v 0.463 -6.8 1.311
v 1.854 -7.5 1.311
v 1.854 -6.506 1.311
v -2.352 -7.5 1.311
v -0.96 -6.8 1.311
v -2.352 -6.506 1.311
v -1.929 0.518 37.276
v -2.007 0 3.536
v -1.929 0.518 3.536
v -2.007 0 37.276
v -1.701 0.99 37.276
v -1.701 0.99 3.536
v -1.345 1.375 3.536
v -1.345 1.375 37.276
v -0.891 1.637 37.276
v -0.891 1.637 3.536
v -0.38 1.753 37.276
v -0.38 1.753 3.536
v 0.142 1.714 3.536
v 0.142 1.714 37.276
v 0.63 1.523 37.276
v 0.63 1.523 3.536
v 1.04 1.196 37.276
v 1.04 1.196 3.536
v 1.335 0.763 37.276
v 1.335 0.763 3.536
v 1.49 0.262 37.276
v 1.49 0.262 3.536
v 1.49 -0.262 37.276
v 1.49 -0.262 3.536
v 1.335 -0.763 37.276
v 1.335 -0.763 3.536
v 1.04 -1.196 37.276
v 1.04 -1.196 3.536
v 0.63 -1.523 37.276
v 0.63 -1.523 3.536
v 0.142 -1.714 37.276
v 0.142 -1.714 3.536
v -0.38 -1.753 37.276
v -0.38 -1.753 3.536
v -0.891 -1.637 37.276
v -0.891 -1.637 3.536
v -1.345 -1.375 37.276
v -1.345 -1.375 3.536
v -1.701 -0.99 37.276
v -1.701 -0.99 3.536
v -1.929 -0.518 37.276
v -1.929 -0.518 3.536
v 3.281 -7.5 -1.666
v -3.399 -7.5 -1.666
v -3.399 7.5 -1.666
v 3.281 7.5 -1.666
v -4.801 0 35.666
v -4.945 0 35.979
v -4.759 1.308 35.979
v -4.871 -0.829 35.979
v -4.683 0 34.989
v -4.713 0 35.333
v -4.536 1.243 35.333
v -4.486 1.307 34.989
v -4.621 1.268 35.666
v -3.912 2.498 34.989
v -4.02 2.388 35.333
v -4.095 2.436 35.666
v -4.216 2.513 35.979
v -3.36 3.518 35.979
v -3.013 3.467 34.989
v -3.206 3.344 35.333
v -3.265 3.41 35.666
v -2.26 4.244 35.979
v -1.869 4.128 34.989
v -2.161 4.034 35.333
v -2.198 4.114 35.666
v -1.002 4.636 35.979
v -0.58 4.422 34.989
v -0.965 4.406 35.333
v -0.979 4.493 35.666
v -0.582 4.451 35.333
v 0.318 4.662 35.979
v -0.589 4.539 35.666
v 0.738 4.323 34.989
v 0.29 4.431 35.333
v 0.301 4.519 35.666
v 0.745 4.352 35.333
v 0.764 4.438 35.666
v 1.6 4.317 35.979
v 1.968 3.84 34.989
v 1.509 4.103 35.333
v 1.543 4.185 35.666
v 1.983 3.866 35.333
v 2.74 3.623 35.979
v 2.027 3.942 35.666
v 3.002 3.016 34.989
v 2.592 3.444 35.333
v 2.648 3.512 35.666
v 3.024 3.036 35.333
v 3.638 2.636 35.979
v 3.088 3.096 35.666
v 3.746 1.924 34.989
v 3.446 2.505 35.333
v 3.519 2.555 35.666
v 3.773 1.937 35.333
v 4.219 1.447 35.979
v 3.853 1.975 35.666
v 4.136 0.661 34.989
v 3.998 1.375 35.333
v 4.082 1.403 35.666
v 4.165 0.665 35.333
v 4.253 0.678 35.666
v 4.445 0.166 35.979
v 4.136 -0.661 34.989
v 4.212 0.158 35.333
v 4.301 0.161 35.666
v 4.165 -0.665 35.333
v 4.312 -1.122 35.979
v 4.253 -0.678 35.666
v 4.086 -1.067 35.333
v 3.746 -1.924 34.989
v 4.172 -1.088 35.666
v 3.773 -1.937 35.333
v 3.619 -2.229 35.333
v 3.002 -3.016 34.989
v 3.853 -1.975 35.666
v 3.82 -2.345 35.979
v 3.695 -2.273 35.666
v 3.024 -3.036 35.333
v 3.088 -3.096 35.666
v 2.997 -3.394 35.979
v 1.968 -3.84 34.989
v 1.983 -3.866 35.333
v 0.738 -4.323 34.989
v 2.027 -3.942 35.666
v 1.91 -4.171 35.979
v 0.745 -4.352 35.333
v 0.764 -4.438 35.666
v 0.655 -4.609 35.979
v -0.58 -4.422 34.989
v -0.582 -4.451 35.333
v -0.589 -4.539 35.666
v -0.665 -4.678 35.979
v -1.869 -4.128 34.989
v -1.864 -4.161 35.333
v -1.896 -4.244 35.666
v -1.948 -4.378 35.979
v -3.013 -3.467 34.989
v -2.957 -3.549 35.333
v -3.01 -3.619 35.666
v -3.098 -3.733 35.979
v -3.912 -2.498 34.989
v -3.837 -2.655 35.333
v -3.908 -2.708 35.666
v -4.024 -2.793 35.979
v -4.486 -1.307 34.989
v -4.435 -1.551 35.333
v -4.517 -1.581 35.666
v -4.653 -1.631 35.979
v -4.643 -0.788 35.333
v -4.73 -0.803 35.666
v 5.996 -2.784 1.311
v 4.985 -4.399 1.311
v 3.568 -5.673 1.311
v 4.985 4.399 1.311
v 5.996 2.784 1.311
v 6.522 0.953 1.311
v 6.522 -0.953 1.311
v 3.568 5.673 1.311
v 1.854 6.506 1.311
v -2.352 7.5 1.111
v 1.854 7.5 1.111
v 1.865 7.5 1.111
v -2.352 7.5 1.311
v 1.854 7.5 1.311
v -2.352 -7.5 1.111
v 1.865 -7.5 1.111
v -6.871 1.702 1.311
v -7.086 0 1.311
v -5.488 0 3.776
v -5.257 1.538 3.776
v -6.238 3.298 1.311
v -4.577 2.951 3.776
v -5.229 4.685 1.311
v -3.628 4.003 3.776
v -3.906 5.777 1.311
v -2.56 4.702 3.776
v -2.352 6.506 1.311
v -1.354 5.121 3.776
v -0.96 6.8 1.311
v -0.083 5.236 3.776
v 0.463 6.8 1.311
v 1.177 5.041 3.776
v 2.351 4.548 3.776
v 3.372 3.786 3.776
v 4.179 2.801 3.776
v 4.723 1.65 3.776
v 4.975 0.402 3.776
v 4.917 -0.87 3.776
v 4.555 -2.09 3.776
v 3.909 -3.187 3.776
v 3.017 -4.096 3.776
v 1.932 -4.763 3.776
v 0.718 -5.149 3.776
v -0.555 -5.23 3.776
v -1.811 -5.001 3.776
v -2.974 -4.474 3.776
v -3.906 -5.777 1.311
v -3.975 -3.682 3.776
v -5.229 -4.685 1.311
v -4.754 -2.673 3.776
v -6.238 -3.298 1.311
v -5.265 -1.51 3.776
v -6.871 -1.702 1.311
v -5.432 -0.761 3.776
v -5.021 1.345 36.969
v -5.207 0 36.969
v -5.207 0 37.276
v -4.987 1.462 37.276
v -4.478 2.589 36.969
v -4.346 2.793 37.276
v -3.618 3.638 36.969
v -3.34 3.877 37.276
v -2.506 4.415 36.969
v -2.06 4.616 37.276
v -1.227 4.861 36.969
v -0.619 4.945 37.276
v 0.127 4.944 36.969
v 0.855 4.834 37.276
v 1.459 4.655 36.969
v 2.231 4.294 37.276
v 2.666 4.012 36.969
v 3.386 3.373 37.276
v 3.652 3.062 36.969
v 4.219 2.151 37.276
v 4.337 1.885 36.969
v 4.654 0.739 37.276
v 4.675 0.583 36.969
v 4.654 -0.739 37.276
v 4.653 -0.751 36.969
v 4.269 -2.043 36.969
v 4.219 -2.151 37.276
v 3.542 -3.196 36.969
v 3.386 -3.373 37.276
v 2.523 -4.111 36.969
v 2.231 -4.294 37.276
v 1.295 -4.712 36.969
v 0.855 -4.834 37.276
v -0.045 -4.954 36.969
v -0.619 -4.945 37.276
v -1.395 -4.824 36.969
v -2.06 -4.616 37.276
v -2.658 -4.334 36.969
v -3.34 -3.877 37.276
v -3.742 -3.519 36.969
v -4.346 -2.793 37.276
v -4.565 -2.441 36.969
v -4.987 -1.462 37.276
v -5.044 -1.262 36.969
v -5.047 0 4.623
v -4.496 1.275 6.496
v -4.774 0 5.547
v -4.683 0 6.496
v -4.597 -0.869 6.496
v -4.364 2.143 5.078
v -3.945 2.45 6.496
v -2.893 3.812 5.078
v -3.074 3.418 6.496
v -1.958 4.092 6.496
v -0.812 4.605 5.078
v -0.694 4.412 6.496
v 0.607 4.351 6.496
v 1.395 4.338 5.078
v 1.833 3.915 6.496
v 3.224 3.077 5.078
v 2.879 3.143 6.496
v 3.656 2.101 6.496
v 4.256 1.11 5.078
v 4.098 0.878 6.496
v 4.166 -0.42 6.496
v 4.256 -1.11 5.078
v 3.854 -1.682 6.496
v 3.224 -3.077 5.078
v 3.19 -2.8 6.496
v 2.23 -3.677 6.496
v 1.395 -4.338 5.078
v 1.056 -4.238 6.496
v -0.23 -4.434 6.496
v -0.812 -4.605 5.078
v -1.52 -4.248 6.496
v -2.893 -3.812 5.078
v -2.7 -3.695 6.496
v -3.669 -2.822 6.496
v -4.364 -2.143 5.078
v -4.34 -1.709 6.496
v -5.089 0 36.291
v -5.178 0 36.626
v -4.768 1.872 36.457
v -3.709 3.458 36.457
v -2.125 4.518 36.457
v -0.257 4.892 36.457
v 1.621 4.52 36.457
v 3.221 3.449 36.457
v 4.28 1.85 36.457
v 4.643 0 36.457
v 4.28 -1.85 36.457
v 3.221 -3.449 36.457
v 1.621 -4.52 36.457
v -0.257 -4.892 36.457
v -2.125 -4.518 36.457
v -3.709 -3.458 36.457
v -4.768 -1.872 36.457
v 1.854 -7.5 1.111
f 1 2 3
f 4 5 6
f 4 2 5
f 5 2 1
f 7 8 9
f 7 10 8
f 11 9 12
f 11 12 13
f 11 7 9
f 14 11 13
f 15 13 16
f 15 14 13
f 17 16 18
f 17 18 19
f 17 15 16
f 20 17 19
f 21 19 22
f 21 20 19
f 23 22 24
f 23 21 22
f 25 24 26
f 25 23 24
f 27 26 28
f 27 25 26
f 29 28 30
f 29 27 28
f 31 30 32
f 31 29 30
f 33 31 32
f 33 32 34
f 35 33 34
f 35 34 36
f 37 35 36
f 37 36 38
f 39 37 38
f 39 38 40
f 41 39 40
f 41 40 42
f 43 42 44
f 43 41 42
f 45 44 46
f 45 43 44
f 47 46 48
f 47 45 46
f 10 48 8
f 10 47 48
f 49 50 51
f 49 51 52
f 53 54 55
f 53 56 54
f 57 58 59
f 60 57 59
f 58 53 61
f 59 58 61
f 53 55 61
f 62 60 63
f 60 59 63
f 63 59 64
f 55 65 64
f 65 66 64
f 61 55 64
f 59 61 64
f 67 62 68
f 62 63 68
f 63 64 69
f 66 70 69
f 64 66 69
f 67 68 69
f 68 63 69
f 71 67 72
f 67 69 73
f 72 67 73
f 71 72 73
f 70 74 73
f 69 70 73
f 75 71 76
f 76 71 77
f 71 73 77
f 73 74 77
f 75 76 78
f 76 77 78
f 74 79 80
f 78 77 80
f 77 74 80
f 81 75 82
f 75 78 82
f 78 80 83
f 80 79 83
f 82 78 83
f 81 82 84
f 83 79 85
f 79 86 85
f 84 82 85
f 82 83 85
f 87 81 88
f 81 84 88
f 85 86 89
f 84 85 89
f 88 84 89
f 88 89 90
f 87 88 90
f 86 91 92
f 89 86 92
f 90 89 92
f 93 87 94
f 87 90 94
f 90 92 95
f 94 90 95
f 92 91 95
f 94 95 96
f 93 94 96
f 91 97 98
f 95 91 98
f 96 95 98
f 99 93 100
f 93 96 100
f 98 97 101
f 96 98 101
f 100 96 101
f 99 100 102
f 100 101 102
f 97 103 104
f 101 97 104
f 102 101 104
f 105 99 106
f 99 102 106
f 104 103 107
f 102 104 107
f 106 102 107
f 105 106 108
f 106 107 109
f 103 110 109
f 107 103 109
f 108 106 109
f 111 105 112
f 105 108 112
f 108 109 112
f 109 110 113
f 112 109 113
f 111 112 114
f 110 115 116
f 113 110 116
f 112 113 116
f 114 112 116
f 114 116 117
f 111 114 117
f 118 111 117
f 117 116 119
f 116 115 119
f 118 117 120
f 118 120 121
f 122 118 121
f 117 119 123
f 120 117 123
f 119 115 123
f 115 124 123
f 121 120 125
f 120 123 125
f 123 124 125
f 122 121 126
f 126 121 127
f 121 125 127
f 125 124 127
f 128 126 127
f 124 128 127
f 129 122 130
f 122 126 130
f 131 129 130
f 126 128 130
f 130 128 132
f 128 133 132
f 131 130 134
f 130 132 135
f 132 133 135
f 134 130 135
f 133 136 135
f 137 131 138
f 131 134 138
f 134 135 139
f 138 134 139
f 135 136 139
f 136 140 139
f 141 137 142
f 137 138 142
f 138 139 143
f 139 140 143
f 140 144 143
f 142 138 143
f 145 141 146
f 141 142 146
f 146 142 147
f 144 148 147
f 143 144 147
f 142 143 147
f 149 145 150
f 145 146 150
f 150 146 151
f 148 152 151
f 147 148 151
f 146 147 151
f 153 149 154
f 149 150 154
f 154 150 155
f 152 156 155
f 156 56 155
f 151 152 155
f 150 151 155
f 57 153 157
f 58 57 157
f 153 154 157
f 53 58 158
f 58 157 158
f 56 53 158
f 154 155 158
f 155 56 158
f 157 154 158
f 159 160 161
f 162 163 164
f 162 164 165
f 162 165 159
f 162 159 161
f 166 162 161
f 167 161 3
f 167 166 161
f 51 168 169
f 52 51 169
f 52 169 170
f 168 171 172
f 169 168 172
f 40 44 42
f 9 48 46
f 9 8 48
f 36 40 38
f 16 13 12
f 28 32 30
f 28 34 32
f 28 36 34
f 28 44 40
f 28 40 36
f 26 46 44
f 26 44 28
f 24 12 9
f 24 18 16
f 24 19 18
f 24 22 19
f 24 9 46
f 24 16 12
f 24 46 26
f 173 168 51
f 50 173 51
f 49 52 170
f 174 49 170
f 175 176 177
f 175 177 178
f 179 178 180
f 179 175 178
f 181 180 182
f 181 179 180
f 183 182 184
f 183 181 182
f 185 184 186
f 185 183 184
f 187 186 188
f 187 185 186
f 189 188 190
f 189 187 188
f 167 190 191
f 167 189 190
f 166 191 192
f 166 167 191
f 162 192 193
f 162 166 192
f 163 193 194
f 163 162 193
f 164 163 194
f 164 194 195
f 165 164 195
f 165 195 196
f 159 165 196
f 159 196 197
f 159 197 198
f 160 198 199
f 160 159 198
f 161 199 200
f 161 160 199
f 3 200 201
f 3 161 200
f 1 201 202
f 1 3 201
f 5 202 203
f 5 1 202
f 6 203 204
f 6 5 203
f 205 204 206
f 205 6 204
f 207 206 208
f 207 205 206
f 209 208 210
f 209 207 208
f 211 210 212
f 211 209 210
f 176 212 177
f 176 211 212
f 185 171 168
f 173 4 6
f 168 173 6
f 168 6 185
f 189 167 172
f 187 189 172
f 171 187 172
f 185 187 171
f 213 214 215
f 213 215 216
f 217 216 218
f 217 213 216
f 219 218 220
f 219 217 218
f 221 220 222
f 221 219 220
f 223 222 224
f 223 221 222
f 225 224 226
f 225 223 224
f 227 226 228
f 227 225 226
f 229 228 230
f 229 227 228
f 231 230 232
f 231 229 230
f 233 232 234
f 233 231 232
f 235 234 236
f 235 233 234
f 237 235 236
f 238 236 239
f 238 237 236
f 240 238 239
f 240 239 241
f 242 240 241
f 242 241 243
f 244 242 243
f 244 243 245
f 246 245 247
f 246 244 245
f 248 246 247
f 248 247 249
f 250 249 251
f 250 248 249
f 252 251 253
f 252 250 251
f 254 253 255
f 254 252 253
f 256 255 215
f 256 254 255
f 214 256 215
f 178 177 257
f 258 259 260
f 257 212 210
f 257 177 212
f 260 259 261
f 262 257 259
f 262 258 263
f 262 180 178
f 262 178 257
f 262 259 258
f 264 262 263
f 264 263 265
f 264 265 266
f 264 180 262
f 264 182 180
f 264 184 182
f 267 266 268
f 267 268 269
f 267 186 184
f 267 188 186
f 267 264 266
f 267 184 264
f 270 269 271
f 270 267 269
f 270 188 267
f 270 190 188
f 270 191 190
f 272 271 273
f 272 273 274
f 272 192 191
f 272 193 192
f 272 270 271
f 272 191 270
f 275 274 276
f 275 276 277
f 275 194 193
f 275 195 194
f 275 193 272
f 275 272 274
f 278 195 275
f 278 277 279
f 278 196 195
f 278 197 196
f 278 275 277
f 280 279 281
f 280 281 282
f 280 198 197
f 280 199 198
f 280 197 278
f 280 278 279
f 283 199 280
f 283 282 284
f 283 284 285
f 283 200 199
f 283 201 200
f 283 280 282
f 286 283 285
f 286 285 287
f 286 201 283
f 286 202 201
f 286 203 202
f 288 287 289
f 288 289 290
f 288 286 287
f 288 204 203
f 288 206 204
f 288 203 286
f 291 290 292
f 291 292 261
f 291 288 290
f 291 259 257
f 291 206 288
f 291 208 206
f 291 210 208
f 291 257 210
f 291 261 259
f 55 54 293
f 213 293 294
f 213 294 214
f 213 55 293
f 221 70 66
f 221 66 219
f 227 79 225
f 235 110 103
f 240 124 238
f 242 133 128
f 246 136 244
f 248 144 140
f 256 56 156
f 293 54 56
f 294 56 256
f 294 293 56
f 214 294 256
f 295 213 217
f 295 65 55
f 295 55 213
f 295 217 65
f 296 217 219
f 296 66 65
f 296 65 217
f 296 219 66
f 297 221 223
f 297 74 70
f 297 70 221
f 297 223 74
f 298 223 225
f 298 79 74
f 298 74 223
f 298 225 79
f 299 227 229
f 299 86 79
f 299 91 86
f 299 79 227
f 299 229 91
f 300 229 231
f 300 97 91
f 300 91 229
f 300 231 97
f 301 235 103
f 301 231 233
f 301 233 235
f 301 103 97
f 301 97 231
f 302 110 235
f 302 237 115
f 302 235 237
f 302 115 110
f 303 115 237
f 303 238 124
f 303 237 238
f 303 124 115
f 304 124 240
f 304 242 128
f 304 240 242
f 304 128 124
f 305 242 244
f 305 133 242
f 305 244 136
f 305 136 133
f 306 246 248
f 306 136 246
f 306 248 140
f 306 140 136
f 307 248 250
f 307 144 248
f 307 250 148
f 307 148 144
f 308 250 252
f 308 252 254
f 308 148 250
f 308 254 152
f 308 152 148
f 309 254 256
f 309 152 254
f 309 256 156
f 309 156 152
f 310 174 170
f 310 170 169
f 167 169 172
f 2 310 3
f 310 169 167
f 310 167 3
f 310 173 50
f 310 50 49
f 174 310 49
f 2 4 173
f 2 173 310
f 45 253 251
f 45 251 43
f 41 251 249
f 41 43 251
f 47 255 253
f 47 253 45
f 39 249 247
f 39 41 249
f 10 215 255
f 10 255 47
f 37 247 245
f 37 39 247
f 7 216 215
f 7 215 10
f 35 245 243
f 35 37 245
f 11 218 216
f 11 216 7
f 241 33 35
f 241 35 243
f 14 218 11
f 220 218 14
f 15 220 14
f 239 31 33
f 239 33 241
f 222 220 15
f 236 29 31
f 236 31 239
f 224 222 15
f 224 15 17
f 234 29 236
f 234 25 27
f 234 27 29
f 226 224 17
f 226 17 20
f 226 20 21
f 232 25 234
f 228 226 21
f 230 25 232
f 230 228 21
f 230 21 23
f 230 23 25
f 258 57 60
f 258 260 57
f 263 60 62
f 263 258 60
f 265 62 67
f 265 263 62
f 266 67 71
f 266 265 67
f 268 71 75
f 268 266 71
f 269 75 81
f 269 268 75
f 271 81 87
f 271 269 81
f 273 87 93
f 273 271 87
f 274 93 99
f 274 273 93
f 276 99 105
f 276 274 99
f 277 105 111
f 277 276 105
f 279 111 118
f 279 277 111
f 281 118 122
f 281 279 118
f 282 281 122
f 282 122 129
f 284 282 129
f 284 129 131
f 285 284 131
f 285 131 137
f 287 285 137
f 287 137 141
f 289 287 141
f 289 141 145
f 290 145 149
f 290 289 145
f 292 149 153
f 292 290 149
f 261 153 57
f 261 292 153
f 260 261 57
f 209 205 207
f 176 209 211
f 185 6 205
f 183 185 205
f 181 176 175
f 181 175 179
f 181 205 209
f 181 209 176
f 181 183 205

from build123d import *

# Parameters (mm, degrees)
F1_DEPTH    = 7.5
F3_R        = 5
F4_S5_R     = 4.9585432895
F4_T6_DEPTH = 9
F5_R        = 2


# Not quite as in the source:
# - a fillet or chamfer that OpenCascade refuses, or shapes differently, is made with other operations: its cross-section is extruded or revolved along the edge and cut away or added
# - a feature names something its author has since deleted; it is built from what else it names


with BuildPart() as f1:
    # F0 (on Front) → F1 (new body, symmetric)
    with BuildSketch(Plane.XZ):
        Polygon((-2.3518713359, 1.3106813192), (-2.3518713359, 1.1106813192), (1.854373375, 1.1106813192), (1.854373375, 1.3106813192), (-0.2487489805, 1.3106813192), align=None)
        Polygon((-3.3989118356, -1.6660219789), (3.2814688813, -1.6660219789), (1.8650586641, 1.1106813192), (1.854373375, 1.1106813192), (-2.3518713359, 1.1106813192), align=None)
    extrude(amount=F1_DEPTH, both=True)

    # F0 (on Front) → F2 (revolve)
    with BuildSketch(Plane.XZ):
        Polygon((-7.0862104185, 1.3106813192), (-2.3518713359, 1.3106813192), (-0.2487489805, 1.3106813192), (-0.2487489805, 3.5361030605), (-2.0069789607, 3.5361030605), (-2.0069789607, 37.2762935372), (-5.2072922699, 37.2762935372), (-5.2072922699, 36.3391824067), (-4.6829497442, 35.7728934956), (-4.6829497442, 5.0174454227), align=None)
    revolve(axis=Axis((-0.2487489805, 0, -2.0752633687), (0, 0, -1)))

    # F3
    f3_edges = [f1.edges().sort_by_distance(p)[0] for p in [
        (4.185452, 0, 5.017445),
    ]]
    fillet(f3_edges, radius=F3_R)

    # F4: fillet of radius 2 on 1 edges, made by hand


with BuildPart() as f4_tool2:
    # F4_s3 → F4_t4 (revolve)
    with BuildSketch(Plane.XZ):
        with BuildLine():
            ThreePointArc((-4.6829497442, 34.9891533442), (-4.8208218936, 35.718865526), (-5.2154296124, 36.3479707207))
            Line((-5.2154296124, 36.3479707207), (-4.6829497442, 35.7728934956))
            Line((-4.6829497442, 35.7728934956), (-4.6829497442, 34.9891533442))
        make_face()
    revolve(axis=Axis((-0.2487489805, 0, 35.7728934956), (0, 0, -1)))

    # F4_s5 → F4_t6 (intersect, symmetric)
    with BuildSketch(Plane.XY.offset(35.7)):
        with Locations((-0.2487489805, 0)):
            Circle(F4_S5_R)
    extrude(amount=F4_T6_DEPTH, both=True, mode=Mode.INTERSECT)


with BuildPart() as f1_1:
    add(f1.part)

    # F4_t1: union F4_tool2
    add(f4_tool2.part)

    # F5
    f5_edges = [f1_1.edges().sort_by_distance(p)[0] for p in [
        (-0.248749, 4.958543, 36.339129),
        (-0.248749, -4.958543, 36.339129),
    ]]
    fillet(f5_edges, radius=F5_R)


solid = f1_1.part
